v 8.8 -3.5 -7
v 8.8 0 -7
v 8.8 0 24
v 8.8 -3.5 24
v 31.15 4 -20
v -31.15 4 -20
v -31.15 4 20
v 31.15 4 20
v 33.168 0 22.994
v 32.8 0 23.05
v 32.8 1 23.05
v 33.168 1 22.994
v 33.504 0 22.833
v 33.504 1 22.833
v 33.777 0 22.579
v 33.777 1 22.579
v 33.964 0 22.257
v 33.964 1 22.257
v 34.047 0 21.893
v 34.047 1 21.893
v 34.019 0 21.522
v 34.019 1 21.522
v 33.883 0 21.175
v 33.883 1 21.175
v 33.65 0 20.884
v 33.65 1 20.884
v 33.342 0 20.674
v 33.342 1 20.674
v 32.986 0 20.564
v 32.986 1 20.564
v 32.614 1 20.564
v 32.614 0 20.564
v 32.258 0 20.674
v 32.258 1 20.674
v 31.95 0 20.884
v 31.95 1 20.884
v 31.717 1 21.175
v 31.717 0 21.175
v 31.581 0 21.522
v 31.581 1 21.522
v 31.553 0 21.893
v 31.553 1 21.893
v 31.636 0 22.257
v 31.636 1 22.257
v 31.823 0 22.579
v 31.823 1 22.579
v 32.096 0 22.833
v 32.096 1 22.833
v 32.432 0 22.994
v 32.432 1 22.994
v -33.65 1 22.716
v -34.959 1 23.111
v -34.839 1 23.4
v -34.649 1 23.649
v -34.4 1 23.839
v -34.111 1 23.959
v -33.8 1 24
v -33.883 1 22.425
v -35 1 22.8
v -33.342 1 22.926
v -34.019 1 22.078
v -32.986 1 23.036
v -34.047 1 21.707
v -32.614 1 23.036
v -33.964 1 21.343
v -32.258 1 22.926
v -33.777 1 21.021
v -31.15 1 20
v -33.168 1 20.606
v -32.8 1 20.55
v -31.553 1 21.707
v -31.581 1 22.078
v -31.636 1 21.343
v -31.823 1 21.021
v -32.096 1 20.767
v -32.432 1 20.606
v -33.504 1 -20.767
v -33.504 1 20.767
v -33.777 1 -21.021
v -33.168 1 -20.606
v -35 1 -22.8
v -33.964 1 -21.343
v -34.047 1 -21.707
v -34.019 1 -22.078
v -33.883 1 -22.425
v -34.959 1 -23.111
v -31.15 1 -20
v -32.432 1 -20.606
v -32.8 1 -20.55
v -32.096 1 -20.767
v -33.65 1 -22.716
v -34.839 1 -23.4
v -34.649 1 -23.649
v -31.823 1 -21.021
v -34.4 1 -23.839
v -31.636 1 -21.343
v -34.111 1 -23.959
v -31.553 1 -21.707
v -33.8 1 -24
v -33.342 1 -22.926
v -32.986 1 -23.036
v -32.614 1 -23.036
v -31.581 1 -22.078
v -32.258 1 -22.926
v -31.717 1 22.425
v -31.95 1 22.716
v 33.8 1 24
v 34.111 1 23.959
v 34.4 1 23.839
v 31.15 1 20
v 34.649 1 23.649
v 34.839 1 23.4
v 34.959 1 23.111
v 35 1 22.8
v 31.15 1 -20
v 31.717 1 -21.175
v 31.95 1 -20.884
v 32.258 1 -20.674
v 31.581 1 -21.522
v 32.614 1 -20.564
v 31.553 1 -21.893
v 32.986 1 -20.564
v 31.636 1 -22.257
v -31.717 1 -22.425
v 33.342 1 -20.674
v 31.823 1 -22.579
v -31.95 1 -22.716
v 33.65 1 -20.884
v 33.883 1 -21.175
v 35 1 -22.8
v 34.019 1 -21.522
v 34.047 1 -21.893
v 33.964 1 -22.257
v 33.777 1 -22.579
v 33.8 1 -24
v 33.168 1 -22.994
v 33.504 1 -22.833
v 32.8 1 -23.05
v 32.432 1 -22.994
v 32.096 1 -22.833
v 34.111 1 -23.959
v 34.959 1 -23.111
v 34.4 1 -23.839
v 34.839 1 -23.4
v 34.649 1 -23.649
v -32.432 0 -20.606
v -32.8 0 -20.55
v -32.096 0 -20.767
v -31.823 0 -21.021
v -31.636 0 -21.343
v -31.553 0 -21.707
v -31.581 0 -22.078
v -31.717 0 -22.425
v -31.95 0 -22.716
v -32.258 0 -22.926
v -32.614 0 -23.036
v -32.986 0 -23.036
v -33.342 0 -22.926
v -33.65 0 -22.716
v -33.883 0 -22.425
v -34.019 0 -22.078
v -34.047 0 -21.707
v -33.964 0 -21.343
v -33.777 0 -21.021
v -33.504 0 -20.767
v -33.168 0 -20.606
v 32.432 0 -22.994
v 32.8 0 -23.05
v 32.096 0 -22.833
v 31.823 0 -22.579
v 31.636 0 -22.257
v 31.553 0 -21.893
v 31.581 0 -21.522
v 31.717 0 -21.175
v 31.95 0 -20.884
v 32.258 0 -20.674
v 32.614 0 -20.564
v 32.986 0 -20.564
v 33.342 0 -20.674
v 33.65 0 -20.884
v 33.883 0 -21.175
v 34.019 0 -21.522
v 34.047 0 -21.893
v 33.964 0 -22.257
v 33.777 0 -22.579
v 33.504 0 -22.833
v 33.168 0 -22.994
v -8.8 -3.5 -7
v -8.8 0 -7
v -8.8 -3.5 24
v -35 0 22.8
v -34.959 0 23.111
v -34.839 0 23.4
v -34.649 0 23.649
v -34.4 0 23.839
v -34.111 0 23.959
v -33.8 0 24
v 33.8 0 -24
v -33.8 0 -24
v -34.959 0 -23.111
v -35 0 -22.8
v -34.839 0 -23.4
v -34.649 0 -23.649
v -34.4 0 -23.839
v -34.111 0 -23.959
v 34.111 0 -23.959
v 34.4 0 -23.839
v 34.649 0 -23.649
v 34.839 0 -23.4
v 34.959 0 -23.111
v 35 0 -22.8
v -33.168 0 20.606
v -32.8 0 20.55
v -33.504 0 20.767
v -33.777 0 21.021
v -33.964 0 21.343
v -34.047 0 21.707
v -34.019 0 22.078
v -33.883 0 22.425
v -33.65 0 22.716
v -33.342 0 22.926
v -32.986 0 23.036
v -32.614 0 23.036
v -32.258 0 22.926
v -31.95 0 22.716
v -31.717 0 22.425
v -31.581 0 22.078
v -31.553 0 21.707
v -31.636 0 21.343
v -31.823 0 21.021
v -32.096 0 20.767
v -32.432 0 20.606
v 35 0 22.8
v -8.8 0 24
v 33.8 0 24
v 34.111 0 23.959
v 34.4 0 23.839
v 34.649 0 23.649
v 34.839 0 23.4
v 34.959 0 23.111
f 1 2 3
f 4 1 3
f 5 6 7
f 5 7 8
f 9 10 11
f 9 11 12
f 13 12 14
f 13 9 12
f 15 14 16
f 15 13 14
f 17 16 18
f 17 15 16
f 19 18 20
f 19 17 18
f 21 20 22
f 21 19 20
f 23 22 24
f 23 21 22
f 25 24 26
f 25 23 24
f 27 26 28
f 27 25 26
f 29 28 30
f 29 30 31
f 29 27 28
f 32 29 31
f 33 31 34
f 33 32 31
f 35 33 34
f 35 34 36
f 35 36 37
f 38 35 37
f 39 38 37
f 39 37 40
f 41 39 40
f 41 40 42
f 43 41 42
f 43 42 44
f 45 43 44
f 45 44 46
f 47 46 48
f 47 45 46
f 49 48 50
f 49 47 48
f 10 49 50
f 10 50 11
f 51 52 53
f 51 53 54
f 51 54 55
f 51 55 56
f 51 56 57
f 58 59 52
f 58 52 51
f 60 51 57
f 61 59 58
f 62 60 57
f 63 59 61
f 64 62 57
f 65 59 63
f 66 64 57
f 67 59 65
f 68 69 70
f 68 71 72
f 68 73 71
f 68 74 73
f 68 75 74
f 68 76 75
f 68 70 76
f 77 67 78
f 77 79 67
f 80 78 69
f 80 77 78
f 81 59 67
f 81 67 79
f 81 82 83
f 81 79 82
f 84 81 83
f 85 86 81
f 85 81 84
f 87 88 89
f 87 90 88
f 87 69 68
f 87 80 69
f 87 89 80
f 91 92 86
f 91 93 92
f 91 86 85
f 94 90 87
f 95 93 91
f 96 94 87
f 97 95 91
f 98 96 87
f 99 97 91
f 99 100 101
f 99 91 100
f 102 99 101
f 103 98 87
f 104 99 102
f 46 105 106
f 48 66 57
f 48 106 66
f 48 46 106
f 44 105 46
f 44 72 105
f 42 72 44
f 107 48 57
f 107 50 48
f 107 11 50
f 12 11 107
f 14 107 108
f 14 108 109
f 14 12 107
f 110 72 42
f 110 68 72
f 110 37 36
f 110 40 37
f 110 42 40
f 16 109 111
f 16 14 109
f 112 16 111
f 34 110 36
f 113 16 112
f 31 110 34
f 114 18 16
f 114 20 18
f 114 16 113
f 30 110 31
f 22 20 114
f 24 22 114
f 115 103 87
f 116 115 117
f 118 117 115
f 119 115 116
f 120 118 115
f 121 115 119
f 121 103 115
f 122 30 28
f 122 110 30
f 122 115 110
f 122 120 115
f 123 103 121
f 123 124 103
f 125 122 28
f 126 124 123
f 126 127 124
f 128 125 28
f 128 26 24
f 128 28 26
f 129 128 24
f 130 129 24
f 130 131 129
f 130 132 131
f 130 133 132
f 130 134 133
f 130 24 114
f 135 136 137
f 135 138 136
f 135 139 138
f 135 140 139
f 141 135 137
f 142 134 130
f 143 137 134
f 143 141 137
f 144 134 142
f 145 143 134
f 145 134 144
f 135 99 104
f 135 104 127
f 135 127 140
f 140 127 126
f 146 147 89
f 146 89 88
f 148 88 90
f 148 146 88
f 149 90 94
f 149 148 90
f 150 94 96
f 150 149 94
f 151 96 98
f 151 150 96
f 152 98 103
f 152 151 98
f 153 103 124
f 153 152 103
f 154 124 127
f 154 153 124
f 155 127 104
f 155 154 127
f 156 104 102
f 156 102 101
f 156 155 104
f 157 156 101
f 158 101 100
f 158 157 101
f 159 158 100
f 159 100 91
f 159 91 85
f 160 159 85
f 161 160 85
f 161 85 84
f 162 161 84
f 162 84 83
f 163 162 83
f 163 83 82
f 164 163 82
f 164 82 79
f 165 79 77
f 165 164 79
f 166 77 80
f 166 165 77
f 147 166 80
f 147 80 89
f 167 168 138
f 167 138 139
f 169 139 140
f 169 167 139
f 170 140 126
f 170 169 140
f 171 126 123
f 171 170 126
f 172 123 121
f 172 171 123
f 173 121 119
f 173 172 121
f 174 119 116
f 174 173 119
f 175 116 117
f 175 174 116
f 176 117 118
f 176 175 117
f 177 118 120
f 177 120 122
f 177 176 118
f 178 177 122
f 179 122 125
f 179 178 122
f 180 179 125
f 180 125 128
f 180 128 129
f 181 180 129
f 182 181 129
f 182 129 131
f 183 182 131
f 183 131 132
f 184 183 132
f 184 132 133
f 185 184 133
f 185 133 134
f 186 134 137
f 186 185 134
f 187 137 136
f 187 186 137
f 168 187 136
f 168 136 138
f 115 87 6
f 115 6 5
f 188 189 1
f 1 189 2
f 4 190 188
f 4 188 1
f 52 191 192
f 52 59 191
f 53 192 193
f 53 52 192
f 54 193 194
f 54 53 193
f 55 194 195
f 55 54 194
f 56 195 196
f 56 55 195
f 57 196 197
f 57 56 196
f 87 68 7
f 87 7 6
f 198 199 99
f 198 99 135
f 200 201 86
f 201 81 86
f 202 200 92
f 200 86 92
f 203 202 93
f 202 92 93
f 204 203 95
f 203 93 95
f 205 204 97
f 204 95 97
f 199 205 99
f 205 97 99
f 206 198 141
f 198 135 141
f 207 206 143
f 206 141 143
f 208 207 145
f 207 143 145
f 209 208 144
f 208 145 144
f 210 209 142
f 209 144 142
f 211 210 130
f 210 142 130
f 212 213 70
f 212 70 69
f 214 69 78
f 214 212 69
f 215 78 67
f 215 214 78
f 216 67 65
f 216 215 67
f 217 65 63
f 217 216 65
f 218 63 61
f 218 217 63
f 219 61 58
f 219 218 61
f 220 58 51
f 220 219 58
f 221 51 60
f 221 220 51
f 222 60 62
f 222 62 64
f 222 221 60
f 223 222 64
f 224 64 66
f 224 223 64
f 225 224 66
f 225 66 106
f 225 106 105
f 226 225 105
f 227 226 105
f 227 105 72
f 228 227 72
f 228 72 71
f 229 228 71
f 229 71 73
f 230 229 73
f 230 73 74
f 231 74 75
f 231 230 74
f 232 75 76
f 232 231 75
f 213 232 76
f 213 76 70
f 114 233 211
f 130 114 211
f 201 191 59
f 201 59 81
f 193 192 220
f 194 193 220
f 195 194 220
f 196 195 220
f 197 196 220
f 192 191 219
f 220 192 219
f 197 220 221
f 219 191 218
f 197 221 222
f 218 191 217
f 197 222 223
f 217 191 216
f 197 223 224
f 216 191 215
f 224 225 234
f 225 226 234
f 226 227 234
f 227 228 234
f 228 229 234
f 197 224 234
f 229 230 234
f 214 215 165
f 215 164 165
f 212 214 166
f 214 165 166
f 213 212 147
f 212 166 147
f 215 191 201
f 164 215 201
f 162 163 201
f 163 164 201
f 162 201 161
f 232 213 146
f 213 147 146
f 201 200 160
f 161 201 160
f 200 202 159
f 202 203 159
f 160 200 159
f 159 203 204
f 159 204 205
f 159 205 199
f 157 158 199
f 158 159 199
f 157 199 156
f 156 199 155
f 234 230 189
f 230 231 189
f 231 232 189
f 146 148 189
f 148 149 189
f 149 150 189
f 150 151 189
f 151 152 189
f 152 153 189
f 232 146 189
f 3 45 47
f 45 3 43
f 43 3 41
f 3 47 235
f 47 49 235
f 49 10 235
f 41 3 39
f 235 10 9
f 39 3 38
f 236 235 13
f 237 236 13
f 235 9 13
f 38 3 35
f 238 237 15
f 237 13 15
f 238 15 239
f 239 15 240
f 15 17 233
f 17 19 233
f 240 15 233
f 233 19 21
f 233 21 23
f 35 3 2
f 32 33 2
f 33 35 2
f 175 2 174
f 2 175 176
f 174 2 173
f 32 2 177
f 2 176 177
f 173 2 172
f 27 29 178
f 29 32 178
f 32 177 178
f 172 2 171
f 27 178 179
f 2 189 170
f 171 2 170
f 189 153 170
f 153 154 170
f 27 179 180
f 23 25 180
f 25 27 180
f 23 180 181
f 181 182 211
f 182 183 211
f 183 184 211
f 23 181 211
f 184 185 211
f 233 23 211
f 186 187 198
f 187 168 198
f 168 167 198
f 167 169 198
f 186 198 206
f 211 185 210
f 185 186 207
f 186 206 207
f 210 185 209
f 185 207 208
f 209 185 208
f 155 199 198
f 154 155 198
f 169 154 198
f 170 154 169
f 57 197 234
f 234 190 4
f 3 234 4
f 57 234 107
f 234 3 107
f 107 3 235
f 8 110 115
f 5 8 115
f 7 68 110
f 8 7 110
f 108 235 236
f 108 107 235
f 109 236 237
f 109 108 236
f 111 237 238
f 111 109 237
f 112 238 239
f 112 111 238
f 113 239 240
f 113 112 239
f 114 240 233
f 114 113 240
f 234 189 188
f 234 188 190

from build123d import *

# Parameters (mm, degrees)
SKETCH1_W           = 70
SKETCH1_H           = 48
SKETCH1_R           = 1.25
BOSS_EXTRUDE1_DEPTH = 1
SKETCH2_W           = 62.3
SKETCH2_H           = 40
BOSS_EXTRUDE2_DEPTH = 3
SKETCH4_W           = 17.6
SKETCH4_H           = 31
BOSS_EXTRUDE3_DEPTH = 3.5
FILLET1_R           = 1.2


with BuildPart() as part:
    # Sketch1 → Boss-Extrude1 (new body)
    with BuildSketch(Plane(origin=(0, 0, 0), x_dir=(1, 0, 0), z_dir=(0, 1, 0))):
        Rectangle(SKETCH1_W, SKETCH1_H)
        with Locations(Location((-32.8, 21.8, 0), (0, 0, 270))):
            Circle(SKETCH1_R, mode=Mode.SUBTRACT)
        with Locations(Location((-32.8, -21.8, 0), (0, 0, 90))):
            Circle(SKETCH1_R, mode=Mode.SUBTRACT)
        with Locations(Location((32.8, -21.8, 0), (0, 0, 270))):
            Circle(SKETCH1_R, mode=Mode.SUBTRACT)
        with Locations(Location((32.8, 21.8, 0), (0, 0, 90))):
            Circle(SKETCH1_R, mode=Mode.SUBTRACT)
    extrude(amount=BOSS_EXTRUDE1_DEPTH)

    # Sketch2 → Boss-Extrude2 (add)
    with BuildSketch(Plane(origin=(0, 1, 0), x_dir=(1, 0, 0), z_dir=(0, 1, 0))):
        Rectangle(SKETCH2_W, SKETCH2_H)
    extrude(amount=BOSS_EXTRUDE2_DEPTH)

    # Sketch4 → Boss-Extrude3 (add)
    with BuildSketch(Plane.XZ):
        with Locations((0, 8.5)):
            Rectangle(SKETCH4_W, SKETCH4_H)
    extrude(amount=BOSS_EXTRUDE3_DEPTH)

    # Fillet1
    fillet1_edges = [part.edges().sort_by_distance(p)[0] for p in [
        (35, 0.5, 24),
        (-35, 0.5, 24),
        (-35, 0.5, -24),
        (35, 0.5, -24),
    ]]
    fillet(fillet1_edges, radius=FILLET1_R)


solid = part.part
